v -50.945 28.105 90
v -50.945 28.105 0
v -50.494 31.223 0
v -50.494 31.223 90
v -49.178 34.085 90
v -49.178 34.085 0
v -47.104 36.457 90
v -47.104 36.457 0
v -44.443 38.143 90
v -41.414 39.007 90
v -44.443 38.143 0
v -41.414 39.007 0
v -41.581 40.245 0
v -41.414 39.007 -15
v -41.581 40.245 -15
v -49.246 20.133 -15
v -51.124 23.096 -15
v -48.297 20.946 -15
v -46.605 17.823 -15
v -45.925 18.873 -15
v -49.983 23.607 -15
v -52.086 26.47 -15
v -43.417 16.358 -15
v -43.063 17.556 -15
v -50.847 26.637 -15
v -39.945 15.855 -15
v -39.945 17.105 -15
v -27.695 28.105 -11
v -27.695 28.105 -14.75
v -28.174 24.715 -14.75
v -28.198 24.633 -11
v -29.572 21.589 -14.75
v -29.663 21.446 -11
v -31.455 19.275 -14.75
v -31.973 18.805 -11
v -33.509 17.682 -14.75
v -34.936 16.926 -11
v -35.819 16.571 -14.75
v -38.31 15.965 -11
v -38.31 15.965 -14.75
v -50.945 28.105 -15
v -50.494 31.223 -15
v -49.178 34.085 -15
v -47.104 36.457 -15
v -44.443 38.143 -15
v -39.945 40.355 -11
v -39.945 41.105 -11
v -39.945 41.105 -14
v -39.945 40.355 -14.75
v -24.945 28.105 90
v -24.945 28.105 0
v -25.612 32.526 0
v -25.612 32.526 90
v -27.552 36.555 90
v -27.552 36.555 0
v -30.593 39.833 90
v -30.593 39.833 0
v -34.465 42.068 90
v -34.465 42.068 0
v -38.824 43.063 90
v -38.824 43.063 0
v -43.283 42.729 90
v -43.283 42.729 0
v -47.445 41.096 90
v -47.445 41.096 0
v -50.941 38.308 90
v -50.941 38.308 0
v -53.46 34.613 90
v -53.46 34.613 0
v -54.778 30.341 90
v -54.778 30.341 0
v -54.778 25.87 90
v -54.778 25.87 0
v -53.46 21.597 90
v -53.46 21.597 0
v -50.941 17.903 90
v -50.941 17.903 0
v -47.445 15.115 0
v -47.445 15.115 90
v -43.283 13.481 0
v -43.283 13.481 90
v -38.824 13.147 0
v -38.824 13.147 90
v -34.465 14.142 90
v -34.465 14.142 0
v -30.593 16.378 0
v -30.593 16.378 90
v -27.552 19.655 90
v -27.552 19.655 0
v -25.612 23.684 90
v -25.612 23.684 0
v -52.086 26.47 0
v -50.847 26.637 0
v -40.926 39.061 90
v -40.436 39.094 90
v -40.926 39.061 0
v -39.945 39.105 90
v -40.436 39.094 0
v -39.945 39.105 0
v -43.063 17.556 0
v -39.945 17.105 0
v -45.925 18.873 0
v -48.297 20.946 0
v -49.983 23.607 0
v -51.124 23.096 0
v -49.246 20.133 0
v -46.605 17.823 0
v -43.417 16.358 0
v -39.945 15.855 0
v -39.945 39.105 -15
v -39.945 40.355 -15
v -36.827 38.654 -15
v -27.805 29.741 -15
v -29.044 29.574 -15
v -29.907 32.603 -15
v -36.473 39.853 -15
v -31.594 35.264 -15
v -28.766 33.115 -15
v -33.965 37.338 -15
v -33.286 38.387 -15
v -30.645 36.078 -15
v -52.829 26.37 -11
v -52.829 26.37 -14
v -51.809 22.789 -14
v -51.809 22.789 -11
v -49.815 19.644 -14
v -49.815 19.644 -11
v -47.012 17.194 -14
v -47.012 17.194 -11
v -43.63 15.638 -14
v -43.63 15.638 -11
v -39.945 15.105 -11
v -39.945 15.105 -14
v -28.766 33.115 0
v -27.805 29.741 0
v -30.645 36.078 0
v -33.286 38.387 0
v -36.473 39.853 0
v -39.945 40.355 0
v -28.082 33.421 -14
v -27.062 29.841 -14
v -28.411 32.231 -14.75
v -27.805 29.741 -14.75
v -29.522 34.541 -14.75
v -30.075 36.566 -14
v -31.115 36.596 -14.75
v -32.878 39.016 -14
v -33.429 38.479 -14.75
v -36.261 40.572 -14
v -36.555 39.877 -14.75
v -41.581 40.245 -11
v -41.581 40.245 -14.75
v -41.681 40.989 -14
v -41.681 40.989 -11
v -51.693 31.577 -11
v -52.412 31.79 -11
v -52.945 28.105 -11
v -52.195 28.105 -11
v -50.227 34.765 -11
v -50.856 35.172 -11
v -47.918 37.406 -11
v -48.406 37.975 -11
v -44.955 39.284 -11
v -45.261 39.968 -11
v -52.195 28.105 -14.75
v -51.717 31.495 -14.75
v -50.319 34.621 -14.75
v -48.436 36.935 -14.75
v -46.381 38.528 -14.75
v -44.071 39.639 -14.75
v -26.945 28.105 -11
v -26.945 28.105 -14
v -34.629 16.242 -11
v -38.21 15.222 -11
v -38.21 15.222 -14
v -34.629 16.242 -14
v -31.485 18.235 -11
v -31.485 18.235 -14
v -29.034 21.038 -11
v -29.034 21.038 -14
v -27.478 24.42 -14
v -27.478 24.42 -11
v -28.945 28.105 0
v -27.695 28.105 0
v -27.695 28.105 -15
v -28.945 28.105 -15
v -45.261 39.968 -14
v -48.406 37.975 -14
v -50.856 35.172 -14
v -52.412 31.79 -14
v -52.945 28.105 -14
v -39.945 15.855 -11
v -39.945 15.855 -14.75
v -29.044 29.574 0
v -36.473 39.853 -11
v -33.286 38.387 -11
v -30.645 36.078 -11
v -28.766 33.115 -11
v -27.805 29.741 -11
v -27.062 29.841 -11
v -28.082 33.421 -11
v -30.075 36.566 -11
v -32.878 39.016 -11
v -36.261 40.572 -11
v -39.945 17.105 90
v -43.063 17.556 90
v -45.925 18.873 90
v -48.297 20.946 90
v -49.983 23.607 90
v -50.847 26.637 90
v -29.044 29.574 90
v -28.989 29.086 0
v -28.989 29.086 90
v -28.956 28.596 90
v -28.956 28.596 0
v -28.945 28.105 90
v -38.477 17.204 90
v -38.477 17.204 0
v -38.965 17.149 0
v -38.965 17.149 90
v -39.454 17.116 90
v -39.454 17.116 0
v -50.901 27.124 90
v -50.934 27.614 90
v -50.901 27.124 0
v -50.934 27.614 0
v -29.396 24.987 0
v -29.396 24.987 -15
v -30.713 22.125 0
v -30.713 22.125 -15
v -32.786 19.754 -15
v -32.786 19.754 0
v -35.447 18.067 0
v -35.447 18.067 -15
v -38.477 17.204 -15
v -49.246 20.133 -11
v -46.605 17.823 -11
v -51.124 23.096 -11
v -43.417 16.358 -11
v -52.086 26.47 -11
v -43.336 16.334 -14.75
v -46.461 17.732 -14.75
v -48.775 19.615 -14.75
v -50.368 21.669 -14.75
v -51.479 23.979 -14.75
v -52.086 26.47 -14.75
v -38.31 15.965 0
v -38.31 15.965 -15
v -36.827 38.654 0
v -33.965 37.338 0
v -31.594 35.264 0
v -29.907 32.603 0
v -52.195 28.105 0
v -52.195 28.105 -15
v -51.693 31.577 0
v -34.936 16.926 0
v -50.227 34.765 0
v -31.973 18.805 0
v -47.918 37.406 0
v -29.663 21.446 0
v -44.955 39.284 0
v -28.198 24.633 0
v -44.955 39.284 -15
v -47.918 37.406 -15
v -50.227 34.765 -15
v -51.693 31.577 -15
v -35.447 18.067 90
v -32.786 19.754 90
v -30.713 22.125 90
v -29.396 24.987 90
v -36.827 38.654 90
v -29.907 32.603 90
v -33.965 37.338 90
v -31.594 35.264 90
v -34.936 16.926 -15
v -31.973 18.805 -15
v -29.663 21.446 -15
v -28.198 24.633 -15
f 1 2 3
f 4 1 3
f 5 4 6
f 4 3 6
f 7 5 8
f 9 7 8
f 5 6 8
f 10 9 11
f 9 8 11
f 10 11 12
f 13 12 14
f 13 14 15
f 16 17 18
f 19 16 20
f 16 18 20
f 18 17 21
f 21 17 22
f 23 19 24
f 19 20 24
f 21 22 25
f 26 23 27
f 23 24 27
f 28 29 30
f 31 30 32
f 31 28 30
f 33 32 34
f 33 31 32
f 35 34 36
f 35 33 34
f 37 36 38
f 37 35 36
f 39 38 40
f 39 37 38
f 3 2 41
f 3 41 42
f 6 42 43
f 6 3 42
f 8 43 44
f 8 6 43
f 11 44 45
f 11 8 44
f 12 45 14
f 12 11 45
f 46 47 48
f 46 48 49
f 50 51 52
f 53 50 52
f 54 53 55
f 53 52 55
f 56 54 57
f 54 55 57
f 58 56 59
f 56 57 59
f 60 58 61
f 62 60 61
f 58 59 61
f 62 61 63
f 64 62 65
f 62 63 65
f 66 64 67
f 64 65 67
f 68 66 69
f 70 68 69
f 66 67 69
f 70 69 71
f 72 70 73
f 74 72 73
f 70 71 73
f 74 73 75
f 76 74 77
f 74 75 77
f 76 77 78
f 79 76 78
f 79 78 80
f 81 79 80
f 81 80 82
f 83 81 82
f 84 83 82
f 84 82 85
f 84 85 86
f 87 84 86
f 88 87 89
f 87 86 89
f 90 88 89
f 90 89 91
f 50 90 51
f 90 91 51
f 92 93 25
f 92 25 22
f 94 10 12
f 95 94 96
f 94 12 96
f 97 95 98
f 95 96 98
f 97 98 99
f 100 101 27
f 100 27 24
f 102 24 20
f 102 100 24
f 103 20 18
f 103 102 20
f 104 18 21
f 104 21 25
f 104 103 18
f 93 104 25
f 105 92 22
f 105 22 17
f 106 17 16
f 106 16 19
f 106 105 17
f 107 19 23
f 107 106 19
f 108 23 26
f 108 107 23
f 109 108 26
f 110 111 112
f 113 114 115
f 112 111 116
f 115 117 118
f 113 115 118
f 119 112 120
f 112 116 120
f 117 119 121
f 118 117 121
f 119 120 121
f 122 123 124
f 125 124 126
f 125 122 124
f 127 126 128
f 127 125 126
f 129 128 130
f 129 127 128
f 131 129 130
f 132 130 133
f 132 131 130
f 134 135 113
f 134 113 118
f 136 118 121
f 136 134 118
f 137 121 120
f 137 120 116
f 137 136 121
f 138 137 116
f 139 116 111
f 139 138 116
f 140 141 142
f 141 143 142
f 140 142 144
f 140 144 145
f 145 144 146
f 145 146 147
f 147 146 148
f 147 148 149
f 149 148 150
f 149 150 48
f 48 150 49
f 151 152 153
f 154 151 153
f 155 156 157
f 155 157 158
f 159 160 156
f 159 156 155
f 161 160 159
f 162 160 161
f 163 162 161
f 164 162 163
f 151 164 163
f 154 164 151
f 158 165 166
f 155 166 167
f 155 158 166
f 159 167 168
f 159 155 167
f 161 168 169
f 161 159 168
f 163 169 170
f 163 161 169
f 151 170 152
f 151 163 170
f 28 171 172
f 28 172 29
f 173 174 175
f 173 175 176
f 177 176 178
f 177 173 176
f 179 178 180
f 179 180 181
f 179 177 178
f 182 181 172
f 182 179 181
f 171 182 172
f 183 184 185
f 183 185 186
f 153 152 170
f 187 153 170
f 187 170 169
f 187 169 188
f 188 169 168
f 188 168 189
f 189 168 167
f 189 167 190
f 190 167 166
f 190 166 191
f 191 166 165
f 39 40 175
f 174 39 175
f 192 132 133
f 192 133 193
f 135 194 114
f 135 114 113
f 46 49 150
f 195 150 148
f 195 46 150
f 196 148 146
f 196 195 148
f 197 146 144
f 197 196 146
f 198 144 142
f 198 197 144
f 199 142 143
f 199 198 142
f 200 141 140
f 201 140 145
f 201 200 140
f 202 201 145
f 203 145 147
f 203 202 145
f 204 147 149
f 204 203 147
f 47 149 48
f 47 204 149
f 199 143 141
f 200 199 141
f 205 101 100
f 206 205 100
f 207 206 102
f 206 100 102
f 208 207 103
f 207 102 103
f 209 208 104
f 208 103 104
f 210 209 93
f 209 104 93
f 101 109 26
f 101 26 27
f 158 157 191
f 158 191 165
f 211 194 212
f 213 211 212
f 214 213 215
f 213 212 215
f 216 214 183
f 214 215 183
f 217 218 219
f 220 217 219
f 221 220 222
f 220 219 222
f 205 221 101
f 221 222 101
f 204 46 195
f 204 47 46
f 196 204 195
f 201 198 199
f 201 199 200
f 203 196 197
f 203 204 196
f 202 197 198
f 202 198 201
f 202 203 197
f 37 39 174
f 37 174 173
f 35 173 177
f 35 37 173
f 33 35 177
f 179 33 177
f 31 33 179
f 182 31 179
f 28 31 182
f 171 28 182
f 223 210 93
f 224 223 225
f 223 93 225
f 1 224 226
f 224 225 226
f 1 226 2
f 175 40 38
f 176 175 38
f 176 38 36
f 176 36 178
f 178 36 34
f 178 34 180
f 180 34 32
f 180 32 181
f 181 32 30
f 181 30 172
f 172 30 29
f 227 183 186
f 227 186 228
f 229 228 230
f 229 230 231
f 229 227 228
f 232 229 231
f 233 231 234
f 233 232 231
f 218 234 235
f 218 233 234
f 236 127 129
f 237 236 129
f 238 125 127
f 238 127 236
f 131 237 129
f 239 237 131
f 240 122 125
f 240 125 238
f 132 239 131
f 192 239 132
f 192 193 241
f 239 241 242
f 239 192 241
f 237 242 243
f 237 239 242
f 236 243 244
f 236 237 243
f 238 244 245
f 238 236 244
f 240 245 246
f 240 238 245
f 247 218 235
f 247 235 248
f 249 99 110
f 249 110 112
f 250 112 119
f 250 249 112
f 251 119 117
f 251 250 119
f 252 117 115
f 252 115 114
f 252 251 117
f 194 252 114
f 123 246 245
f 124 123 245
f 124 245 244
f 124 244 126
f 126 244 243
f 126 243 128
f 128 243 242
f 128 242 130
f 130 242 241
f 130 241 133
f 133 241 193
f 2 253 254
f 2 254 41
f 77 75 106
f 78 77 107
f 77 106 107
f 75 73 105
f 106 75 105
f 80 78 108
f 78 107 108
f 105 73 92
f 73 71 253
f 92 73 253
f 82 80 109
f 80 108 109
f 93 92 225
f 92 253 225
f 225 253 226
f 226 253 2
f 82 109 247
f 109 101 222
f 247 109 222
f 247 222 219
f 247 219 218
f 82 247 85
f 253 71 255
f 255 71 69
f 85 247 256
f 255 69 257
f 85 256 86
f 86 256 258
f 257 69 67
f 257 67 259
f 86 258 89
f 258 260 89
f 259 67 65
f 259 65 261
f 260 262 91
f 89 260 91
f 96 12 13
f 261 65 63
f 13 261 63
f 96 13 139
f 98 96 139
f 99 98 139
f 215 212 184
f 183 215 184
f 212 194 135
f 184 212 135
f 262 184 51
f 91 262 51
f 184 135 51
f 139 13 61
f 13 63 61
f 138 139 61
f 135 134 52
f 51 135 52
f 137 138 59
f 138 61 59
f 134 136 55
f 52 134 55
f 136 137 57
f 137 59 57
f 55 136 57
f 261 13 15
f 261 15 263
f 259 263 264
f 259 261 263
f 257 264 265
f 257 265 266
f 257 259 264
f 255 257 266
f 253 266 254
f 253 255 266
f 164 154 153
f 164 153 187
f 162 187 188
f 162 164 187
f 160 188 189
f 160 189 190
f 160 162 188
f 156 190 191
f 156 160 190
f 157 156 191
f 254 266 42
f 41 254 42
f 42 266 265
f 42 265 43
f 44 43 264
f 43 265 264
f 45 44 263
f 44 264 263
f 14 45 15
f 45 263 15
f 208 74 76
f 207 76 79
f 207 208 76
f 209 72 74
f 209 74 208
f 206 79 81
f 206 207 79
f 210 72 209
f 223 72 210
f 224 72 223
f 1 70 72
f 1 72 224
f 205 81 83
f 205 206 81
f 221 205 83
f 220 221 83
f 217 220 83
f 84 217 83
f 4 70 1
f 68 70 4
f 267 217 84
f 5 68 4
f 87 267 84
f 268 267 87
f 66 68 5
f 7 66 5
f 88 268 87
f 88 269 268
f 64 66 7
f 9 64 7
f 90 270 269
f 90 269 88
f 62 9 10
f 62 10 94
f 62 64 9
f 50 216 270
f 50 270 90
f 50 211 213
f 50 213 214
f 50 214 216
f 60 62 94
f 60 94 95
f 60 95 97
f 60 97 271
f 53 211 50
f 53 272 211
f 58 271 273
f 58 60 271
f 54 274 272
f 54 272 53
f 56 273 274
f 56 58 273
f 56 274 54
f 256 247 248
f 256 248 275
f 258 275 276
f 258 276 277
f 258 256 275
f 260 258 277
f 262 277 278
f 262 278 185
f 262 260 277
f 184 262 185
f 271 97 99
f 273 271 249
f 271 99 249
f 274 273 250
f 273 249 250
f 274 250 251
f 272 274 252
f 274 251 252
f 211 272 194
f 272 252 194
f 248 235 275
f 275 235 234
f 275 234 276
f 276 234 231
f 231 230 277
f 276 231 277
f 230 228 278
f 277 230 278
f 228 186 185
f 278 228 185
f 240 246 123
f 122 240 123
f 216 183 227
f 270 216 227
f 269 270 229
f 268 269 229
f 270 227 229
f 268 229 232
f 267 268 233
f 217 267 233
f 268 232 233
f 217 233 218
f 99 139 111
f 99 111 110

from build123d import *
from build123d import SkipClean  # not in build123d's __all__

# Parameters (mm, degrees)
F0_R          = 15
F1_DEPTH      = 90
F2_DEPTH      = 15
F3_START      = -11
F3_DEPTH      = 4
F4_T2_ANGLE   = 105.003910896
F4_2_T2_ANGLE = 105.003910896
F4_3_T2_ANGLE = 105.003910896
F4_4_T2_ANGLE = 105.003910896


# Not quite as in the source:
# - a fillet or chamfer that OpenCascade refuses, or shapes differently, is made with other operations: its cross-section is extruded or revolved along the edge and cut away or added


with BuildPart() as f1:
    # F0 (on Top) → F1 (new body)
    with BuildSketch(Plane.XY):
        with Locations((-39.9452038109, 28.1051583588)):
            Circle(F0_R)
        with BuildLine():
            ThreePointArc((-27.061585061, 29.8407758013), (-26.9743317556, 28.9749158684), (-26.9452038109, 28.1051583588))
            ThreePointArc((-26.9452038109, 28.1051583588), (-30.1584007897, 19.5483782036), (-38.2095863684, 15.2215396089))
            ThreePointArc((-38.2095863684, 15.2215396089), (-39.0754463013, 15.1342863035), (-39.9452038109, 15.1051583588))
            ThreePointArc((-39.9452038109, 15.1051583588), (-48.5019839661, 18.3183553376), (-52.8288225609, 26.3695409163))
            ThreePointArc((-52.8288225609, 26.3695409163), (-52.9160758662, 27.2354008492), (-52.9452038109, 28.1051583588))
            ThreePointArc((-52.9452038109, 28.1051583588), (-49.7320068322, 36.661938514), (-41.6808212534, 40.9887771087))
            ThreePointArc((-41.6808212534, 40.9887771087), (-40.8149613205, 41.0760304141), (-39.9452038109, 41.1051583588))
            ThreePointArc((-39.9452038109, 41.1051583588), (-31.3884236558, 37.89196138), (-27.061585061, 29.8407758013))
        make_face(mode=Mode.SUBTRACT)
        with BuildLine():
            ThreePointArc((-52.0855368637, 26.4696726918), (-48.0083235725, 18.8829785888), (-39.9452038109, 15.8551583588))
            Line((-39.9452038109, 15.8551583588), (-39.9452038109, 17.1051583588))
            ThreePointArc((-39.9452038109, 17.1051583588), (-47.1855562499, 19.8240173409), (-50.8467273686, 26.6365589844))
            Line((-50.8467273686, 26.6365589844), (-52.0855368637, 26.4696726918))
        make_face()
        with BuildLine():
            ThreePointArc((-27.8048707581, 29.7406440258), (-27.7226512973, 28.9247375506), (-27.6952038109, 28.1051583588))
            Line((-27.6952038109, 28.1051583588), (-26.9452038109, 28.1051583588))
            ThreePointArc((-26.9452038109, 28.1051583588), (-26.9743317556, 28.9749158684), (-27.061585061, 29.8407758013))
            Line((-27.061585061, 29.8407758013), (-27.8048707581, 29.7406440258))
        make_face()
        with BuildLine():
            ThreePointArc((-39.9452038109, 40.3551583588), (-31.8820840493, 37.3273381288), (-27.8048707581, 29.7406440258))
            Line((-27.8048707581, 29.7406440258), (-27.061585061, 29.8407758013))
            ThreePointArc((-27.061585061, 29.8407758013), (-31.3884236558, 37.89196138), (-39.9452038109, 41.1051583588))
            Line((-39.9452038109, 41.1051583588), (-39.9452038109, 40.3551583588))
        make_face()
        with BuildLine():
            ThreePointArc((-41.5806894779, 40.2454914116), (-40.7647830027, 40.3277108724), (-39.9452038109, 40.3551583588))
            Line((-39.9452038109, 40.3551583588), (-39.9452038109, 41.1051583588))
            ThreePointArc((-39.9452038109, 41.1051583588), (-40.8149613205, 41.0760304141), (-41.6808212534, 40.9887771087))
            Line((-41.6808212534, 40.9887771087), (-41.5806894779, 40.2454914116))
        make_face()
        with BuildLine():
            ThreePointArc((-52.1952038109, 28.1051583588), (-49.1673835809, 36.1682781204), (-41.5806894779, 40.2454914116))
            Line((-41.5806894779, 40.2454914116), (-41.6808212534, 40.9887771087))
            ThreePointArc((-41.6808212534, 40.9887771087), (-49.7320068322, 36.661938514), (-52.9452038109, 28.1051583588))
            Line((-52.9452038109, 28.1051583588), (-52.1952038109, 28.1051583588))
        make_face()
        with BuildLine():
            Line((-52.8288225609, 26.3695409163), (-52.0855368637, 26.4696726918))
            ThreePointArc((-52.0855368637, 26.4696726918), (-52.1677563246, 27.2855791671), (-52.1952038109, 28.1051583588))
            Line((-52.1952038109, 28.1051583588), (-52.9452038109, 28.1051583588))
            ThreePointArc((-52.9452038109, 28.1051583588), (-52.9160758662, 27.2354008492), (-52.8288225609, 26.3695409163))
        make_face()
        with BuildLine():
            Line((-39.9452038109, 15.1051583588), (-39.9452038109, 15.8551583588))
            ThreePointArc((-39.9452038109, 15.8551583588), (-48.0083235725, 18.8829785888), (-52.0855368637, 26.4696726918))
            Line((-52.0855368637, 26.4696726918), (-52.8288225609, 26.3695409163))
            ThreePointArc((-52.8288225609, 26.3695409163), (-48.5019839661, 18.3183553376), (-39.9452038109, 15.1051583588))
        make_face()
        with BuildLine():
            Line((-38.2095863684, 15.2215396089), (-38.309718144, 15.964825306))
            ThreePointArc((-38.309718144, 15.964825306), (-39.1256246192, 15.8826058452), (-39.9452038109, 15.8551583588))
            Line((-39.9452038109, 15.8551583588), (-39.9452038109, 15.1051583588))
            ThreePointArc((-39.9452038109, 15.1051583588), (-39.0754463013, 15.1342863035), (-38.2095863684, 15.2215396089))
        make_face()
        with BuildLine():
            Line((-26.9452038109, 28.1051583588), (-27.6952038109, 28.1051583588))
            ThreePointArc((-27.6952038109, 28.1051583588), (-30.7230240409, 20.0420385972), (-38.309718144, 15.964825306))
            Line((-38.309718144, 15.964825306), (-38.2095863684, 15.2215396089))
            ThreePointArc((-38.2095863684, 15.2215396089), (-30.1584007897, 19.5483782036), (-26.9452038109, 28.1051583588))
        make_face()
        with BuildLine():
            ThreePointArc((-38.309718144, 15.964825306), (-30.7230240409, 20.0420385972), (-27.6952038109, 28.1051583588))
            Line((-27.6952038109, 28.1051583588), (-28.9452038109, 28.1051583588))
            ThreePointArc((-28.9452038109, 28.1051583588), (-31.664062793, 20.8648059198), (-38.4766044365, 17.2036348012))
            Line((-38.4766044365, 17.2036348012), (-38.309718144, 15.964825306))
        make_face()
        with BuildLine():
            Line((-29.0436802533, 29.5737577332), (-27.8048707581, 29.7406440258))
            ThreePointArc((-27.8048707581, 29.7406440258), (-31.8820840493, 37.3273381288), (-39.9452038109, 40.3551583588))
            Line((-39.9452038109, 40.3551583588), (-39.9452038109, 39.1051583588))
            ThreePointArc((-39.9452038109, 39.1051583588), (-32.7048513719, 36.3862993768), (-29.0436802533, 29.5737577332))
        make_face()
        with BuildLine():
            Line((-41.4138031853, 39.0066819164), (-41.5806894779, 40.2454914116))
            ThreePointArc((-41.5806894779, 40.2454914116), (-49.1673835809, 36.1682781204), (-52.1952038109, 28.1051583588))
            Line((-52.1952038109, 28.1051583588), (-50.9452038109, 28.1051583588))
            ThreePointArc((-50.9452038109, 28.1051583588), (-48.2263448289, 35.3455107978), (-41.4138031853, 39.0066819164))
        make_face()
        with BuildLine():
            Line((-39.9452038109, 39.1051583588), (-39.9452038109, 40.3551583588))
            ThreePointArc((-39.9452038109, 40.3551583588), (-40.7647830027, 40.3277108724), (-41.5806894779, 40.2454914116))
            Line((-41.5806894779, 40.2454914116), (-41.4138031853, 39.0066819164))
            ThreePointArc((-41.4138031853, 39.0066819164), (-40.6811524729, 39.0805116364), (-39.9452038109, 39.1051583588))
        make_face()
        with BuildLine():
            Line((-28.9452038109, 28.1051583588), (-27.6952038109, 28.1051583588))
            ThreePointArc((-27.6952038109, 28.1051583588), (-27.7226512973, 28.9247375506), (-27.8048707581, 29.7406440258))
            Line((-27.8048707581, 29.7406440258), (-29.0436802533, 29.5737577332))
            ThreePointArc((-29.0436802533, 29.5737577332), (-28.9698505334, 28.8411070208), (-28.9452038109, 28.1051583588))
        make_face()
        with BuildLine():
            ThreePointArc((-39.9452038109, 15.8551583588), (-39.1256246192, 15.8826058452), (-38.309718144, 15.964825306))
            Line((-38.309718144, 15.964825306), (-38.4766044365, 17.2036348012))
            ThreePointArc((-38.4766044365, 17.2036348012), (-39.209255149, 17.1298050813), (-39.9452038109, 17.1051583588))
            Line((-39.9452038109, 17.1051583588), (-39.9452038109, 15.8551583588))
        make_face()
        with BuildLine():
            ThreePointArc((-52.1952038109, 28.1051583588), (-52.1677563246, 27.2855791671), (-52.0855368637, 26.4696726918))
            Line((-52.0855368637, 26.4696726918), (-50.8467273686, 26.6365589844))
            ThreePointArc((-50.8467273686, 26.6365589844), (-50.9205570885, 27.3692096968), (-50.9452038109, 28.1051583588))
            Line((-50.9452038109, 28.1051583588), (-52.1952038109, 28.1051583588))
        make_face()
    extrude(amount=F1_DEPTH)

    # F0 (on Top) → F2 (join)
    with BuildSketch(Plane.XY):
        with BuildLine():
            Line((-41.4138031853, 39.0066819164), (-41.5806894779, 40.2454914116))
            ThreePointArc((-41.5806894779, 40.2454914116), (-49.1673835809, 36.1682781204), (-52.1952038109, 28.1051583588))
            Line((-52.1952038109, 28.1051583588), (-50.9452038109, 28.1051583588))
            ThreePointArc((-50.9452038109, 28.1051583588), (-48.2263448289, 35.3455107978), (-41.4138031853, 39.0066819164))
        make_face()
        with BuildLine():
            Line((-29.0436802533, 29.5737577332), (-27.8048707581, 29.7406440258))
            ThreePointArc((-27.8048707581, 29.7406440258), (-31.8820840493, 37.3273381288), (-39.9452038109, 40.3551583588))
            Line((-39.9452038109, 40.3551583588), (-39.9452038109, 39.1051583588))
            ThreePointArc((-39.9452038109, 39.1051583588), (-32.7048513719, 36.3862993768), (-29.0436802533, 29.5737577332))
        make_face()
        with BuildLine():
            ThreePointArc((-38.309718144, 15.964825306), (-30.7230240409, 20.0420385972), (-27.6952038109, 28.1051583588))
            Line((-27.6952038109, 28.1051583588), (-28.9452038109, 28.1051583588))
            ThreePointArc((-28.9452038109, 28.1051583588), (-31.664062793, 20.8648059198), (-38.4766044365, 17.2036348012))
            Line((-38.4766044365, 17.2036348012), (-38.309718144, 15.964825306))
        make_face()
        with BuildLine():
            ThreePointArc((-52.0855368637, 26.4696726918), (-48.0083235725, 18.8829785888), (-39.9452038109, 15.8551583588))
            Line((-39.9452038109, 15.8551583588), (-39.9452038109, 17.1051583588))
            ThreePointArc((-39.9452038109, 17.1051583588), (-47.1855562499, 19.8240173409), (-50.8467273686, 26.6365589844))
            Line((-50.8467273686, 26.6365589844), (-52.0855368637, 26.4696726918))
        make_face()
    with SkipClean():  # cleaning this boolean's faces spoils the solid; the shape is the same uncleaned
        extrude(amount=-F2_DEPTH)


with BuildPart() as f3:
    # F0 (on Top) → F3 (new body)
    with BuildSketch(Plane.XY.offset(F3_START)):
        with BuildLine():
            ThreePointArc((-39.9452038109, 40.3551583588), (-31.8820840493, 37.3273381288), (-27.8048707581, 29.7406440258))
            Line((-27.8048707581, 29.7406440258), (-27.061585061, 29.8407758013))
            ThreePointArc((-27.061585061, 29.8407758013), (-31.3884236558, 37.89196138), (-39.9452038109, 41.1051583588))
            Line((-39.9452038109, 41.1051583588), (-39.9452038109, 40.3551583588))
        make_face()
    extrude(amount=-F3_DEPTH)

    # F4#4: chamfer of 1 on 1 edges, made by hand

    # F4_4_s1 → F4_4_t2 (revolve, cut)
    with BuildSketch(Plane(origin=(1.6299605955, 25.4415695588, 0), x_dir=(0, 0, 1), z_dir=(-0.0639357458, -0.9979540172, 0))):
        Polygon((-14, 28.6604008708), (-15, 29.6604008708), (-15, 28.6604008708), align=None)
    revolve(axis=Axis((-39.9452038109, 28.1051583588, -15), (0, 0, 1)), revolution_arc=F4_4_T2_ANGLE, mode=Mode.SUBTRACT)


with BuildPart() as f3b:
    # F0 (on Top) → F3, piece 2 (new body)
    with BuildSketch(Plane.XY.offset(F3_START)):
        with BuildLine():
            Line((-39.9452038109, 15.1051583588), (-39.9452038109, 15.8551583588))
            ThreePointArc((-39.9452038109, 15.8551583588), (-48.0083235725, 18.8829785888), (-52.0855368637, 26.4696726918))
            Line((-52.0855368637, 26.4696726918), (-52.8288225609, 26.3695409163))
            ThreePointArc((-52.8288225609, 26.3695409163), (-48.5019839661, 18.3183553376), (-39.9452038109, 15.1051583588))
        make_face()
    extrude(amount=-F3_DEPTH)

    # F4#3: chamfer of 1 on 1 edges, made by hand

    # F4_3_s1 → F4_3_t2 (revolve, cut)
    with BuildSketch(Plane(origin=(1.6299605955, 25.4415695588, 0), x_dir=(0, 0, 1), z_dir=(0.0639357458, 0.9979540172, 0))):
        Polygon((-14, -54.6604008708), (-15, -53.6604008708), (-15, -54.6604008708), align=None)
    revolve(axis=Axis((-39.9452038109, 28.1051583588, -15), (0, 0, 1)), revolution_arc=F4_3_T2_ANGLE, mode=Mode.SUBTRACT)


with BuildPart() as f3c:
    # F0 (on Top) → F3, piece 3 (new body)
    with BuildSketch(Plane.XY.offset(F3_START)):
        with BuildLine():
            Line((-26.9452038109, 28.1051583588), (-27.6952038109, 28.1051583588))
            ThreePointArc((-27.6952038109, 28.1051583588), (-30.7230240409, 20.0420385972), (-38.309718144, 15.964825306))
            Line((-38.309718144, 15.964825306), (-38.2095863684, 15.2215396089))
            ThreePointArc((-38.2095863684, 15.2215396089), (-30.1584007897, 19.5483782036), (-26.9452038109, 28.1051583588))
        make_face()
    extrude(amount=-F3_DEPTH)

    # F4: chamfer of 1 on 1 edges, made by hand

    # F4_s1 → F4_t2 (revolve, cut)
    with BuildSketch(Plane(origin=(-41.5751644064, 2.6635888001, 0), x_dir=(0, 0, 1), z_dir=(-0.9979540172, 0.0639357458, 0))):
        Polygon((-14, 12.4937292909), (-15, 13.4937292909), (-15, 12.4937292909), align=None)
    revolve(axis=Axis((-39.9452038109, 28.1051583588, -15), (0, 0, 1)), revolution_arc=F4_T2_ANGLE, mode=Mode.SUBTRACT)


with BuildPart() as f3d:
    # F0 (on Top) → F3, piece 4 (new body)
    with BuildSketch(Plane.XY.offset(F3_START)):
        with BuildLine():
            ThreePointArc((-52.1952038109, 28.1051583588), (-49.1673835809, 36.1682781204), (-41.5806894779, 40.2454914116))
            Line((-41.5806894779, 40.2454914116), (-41.6808212534, 40.9887771087))
            ThreePointArc((-41.6808212534, 40.9887771087), (-49.7320068322, 36.661938514), (-52.9452038109, 28.1051583588))
            Line((-52.9452038109, 28.1051583588), (-52.1952038109, 28.1051583588))
        make_face()
    extrude(amount=-F3_DEPTH)

    # F4#2: chamfer of 1 on 1 edges, made by hand

    # F4_2_s1 → F4_2_t2 (revolve, cut)
    with BuildSketch(Plane(origin=(-41.5751644064, 2.6635888001, 0), x_dir=(0, 0, 1), z_dir=(0.9979540172, -0.0639357458, 0))):
        Polygon((-14, -38.4937292909), (-15, -37.4937292909), (-15, -38.4937292909), align=None)
    revolve(axis=Axis((-39.9452038109, 28.1051583588, -15), (0, 0, 1)), revolution_arc=F4_2_T2_ANGLE, mode=Mode.SUBTRACT)


solid = Compound([f1.part, f3.part, f3b.part, f3c.part, f3d.part])
